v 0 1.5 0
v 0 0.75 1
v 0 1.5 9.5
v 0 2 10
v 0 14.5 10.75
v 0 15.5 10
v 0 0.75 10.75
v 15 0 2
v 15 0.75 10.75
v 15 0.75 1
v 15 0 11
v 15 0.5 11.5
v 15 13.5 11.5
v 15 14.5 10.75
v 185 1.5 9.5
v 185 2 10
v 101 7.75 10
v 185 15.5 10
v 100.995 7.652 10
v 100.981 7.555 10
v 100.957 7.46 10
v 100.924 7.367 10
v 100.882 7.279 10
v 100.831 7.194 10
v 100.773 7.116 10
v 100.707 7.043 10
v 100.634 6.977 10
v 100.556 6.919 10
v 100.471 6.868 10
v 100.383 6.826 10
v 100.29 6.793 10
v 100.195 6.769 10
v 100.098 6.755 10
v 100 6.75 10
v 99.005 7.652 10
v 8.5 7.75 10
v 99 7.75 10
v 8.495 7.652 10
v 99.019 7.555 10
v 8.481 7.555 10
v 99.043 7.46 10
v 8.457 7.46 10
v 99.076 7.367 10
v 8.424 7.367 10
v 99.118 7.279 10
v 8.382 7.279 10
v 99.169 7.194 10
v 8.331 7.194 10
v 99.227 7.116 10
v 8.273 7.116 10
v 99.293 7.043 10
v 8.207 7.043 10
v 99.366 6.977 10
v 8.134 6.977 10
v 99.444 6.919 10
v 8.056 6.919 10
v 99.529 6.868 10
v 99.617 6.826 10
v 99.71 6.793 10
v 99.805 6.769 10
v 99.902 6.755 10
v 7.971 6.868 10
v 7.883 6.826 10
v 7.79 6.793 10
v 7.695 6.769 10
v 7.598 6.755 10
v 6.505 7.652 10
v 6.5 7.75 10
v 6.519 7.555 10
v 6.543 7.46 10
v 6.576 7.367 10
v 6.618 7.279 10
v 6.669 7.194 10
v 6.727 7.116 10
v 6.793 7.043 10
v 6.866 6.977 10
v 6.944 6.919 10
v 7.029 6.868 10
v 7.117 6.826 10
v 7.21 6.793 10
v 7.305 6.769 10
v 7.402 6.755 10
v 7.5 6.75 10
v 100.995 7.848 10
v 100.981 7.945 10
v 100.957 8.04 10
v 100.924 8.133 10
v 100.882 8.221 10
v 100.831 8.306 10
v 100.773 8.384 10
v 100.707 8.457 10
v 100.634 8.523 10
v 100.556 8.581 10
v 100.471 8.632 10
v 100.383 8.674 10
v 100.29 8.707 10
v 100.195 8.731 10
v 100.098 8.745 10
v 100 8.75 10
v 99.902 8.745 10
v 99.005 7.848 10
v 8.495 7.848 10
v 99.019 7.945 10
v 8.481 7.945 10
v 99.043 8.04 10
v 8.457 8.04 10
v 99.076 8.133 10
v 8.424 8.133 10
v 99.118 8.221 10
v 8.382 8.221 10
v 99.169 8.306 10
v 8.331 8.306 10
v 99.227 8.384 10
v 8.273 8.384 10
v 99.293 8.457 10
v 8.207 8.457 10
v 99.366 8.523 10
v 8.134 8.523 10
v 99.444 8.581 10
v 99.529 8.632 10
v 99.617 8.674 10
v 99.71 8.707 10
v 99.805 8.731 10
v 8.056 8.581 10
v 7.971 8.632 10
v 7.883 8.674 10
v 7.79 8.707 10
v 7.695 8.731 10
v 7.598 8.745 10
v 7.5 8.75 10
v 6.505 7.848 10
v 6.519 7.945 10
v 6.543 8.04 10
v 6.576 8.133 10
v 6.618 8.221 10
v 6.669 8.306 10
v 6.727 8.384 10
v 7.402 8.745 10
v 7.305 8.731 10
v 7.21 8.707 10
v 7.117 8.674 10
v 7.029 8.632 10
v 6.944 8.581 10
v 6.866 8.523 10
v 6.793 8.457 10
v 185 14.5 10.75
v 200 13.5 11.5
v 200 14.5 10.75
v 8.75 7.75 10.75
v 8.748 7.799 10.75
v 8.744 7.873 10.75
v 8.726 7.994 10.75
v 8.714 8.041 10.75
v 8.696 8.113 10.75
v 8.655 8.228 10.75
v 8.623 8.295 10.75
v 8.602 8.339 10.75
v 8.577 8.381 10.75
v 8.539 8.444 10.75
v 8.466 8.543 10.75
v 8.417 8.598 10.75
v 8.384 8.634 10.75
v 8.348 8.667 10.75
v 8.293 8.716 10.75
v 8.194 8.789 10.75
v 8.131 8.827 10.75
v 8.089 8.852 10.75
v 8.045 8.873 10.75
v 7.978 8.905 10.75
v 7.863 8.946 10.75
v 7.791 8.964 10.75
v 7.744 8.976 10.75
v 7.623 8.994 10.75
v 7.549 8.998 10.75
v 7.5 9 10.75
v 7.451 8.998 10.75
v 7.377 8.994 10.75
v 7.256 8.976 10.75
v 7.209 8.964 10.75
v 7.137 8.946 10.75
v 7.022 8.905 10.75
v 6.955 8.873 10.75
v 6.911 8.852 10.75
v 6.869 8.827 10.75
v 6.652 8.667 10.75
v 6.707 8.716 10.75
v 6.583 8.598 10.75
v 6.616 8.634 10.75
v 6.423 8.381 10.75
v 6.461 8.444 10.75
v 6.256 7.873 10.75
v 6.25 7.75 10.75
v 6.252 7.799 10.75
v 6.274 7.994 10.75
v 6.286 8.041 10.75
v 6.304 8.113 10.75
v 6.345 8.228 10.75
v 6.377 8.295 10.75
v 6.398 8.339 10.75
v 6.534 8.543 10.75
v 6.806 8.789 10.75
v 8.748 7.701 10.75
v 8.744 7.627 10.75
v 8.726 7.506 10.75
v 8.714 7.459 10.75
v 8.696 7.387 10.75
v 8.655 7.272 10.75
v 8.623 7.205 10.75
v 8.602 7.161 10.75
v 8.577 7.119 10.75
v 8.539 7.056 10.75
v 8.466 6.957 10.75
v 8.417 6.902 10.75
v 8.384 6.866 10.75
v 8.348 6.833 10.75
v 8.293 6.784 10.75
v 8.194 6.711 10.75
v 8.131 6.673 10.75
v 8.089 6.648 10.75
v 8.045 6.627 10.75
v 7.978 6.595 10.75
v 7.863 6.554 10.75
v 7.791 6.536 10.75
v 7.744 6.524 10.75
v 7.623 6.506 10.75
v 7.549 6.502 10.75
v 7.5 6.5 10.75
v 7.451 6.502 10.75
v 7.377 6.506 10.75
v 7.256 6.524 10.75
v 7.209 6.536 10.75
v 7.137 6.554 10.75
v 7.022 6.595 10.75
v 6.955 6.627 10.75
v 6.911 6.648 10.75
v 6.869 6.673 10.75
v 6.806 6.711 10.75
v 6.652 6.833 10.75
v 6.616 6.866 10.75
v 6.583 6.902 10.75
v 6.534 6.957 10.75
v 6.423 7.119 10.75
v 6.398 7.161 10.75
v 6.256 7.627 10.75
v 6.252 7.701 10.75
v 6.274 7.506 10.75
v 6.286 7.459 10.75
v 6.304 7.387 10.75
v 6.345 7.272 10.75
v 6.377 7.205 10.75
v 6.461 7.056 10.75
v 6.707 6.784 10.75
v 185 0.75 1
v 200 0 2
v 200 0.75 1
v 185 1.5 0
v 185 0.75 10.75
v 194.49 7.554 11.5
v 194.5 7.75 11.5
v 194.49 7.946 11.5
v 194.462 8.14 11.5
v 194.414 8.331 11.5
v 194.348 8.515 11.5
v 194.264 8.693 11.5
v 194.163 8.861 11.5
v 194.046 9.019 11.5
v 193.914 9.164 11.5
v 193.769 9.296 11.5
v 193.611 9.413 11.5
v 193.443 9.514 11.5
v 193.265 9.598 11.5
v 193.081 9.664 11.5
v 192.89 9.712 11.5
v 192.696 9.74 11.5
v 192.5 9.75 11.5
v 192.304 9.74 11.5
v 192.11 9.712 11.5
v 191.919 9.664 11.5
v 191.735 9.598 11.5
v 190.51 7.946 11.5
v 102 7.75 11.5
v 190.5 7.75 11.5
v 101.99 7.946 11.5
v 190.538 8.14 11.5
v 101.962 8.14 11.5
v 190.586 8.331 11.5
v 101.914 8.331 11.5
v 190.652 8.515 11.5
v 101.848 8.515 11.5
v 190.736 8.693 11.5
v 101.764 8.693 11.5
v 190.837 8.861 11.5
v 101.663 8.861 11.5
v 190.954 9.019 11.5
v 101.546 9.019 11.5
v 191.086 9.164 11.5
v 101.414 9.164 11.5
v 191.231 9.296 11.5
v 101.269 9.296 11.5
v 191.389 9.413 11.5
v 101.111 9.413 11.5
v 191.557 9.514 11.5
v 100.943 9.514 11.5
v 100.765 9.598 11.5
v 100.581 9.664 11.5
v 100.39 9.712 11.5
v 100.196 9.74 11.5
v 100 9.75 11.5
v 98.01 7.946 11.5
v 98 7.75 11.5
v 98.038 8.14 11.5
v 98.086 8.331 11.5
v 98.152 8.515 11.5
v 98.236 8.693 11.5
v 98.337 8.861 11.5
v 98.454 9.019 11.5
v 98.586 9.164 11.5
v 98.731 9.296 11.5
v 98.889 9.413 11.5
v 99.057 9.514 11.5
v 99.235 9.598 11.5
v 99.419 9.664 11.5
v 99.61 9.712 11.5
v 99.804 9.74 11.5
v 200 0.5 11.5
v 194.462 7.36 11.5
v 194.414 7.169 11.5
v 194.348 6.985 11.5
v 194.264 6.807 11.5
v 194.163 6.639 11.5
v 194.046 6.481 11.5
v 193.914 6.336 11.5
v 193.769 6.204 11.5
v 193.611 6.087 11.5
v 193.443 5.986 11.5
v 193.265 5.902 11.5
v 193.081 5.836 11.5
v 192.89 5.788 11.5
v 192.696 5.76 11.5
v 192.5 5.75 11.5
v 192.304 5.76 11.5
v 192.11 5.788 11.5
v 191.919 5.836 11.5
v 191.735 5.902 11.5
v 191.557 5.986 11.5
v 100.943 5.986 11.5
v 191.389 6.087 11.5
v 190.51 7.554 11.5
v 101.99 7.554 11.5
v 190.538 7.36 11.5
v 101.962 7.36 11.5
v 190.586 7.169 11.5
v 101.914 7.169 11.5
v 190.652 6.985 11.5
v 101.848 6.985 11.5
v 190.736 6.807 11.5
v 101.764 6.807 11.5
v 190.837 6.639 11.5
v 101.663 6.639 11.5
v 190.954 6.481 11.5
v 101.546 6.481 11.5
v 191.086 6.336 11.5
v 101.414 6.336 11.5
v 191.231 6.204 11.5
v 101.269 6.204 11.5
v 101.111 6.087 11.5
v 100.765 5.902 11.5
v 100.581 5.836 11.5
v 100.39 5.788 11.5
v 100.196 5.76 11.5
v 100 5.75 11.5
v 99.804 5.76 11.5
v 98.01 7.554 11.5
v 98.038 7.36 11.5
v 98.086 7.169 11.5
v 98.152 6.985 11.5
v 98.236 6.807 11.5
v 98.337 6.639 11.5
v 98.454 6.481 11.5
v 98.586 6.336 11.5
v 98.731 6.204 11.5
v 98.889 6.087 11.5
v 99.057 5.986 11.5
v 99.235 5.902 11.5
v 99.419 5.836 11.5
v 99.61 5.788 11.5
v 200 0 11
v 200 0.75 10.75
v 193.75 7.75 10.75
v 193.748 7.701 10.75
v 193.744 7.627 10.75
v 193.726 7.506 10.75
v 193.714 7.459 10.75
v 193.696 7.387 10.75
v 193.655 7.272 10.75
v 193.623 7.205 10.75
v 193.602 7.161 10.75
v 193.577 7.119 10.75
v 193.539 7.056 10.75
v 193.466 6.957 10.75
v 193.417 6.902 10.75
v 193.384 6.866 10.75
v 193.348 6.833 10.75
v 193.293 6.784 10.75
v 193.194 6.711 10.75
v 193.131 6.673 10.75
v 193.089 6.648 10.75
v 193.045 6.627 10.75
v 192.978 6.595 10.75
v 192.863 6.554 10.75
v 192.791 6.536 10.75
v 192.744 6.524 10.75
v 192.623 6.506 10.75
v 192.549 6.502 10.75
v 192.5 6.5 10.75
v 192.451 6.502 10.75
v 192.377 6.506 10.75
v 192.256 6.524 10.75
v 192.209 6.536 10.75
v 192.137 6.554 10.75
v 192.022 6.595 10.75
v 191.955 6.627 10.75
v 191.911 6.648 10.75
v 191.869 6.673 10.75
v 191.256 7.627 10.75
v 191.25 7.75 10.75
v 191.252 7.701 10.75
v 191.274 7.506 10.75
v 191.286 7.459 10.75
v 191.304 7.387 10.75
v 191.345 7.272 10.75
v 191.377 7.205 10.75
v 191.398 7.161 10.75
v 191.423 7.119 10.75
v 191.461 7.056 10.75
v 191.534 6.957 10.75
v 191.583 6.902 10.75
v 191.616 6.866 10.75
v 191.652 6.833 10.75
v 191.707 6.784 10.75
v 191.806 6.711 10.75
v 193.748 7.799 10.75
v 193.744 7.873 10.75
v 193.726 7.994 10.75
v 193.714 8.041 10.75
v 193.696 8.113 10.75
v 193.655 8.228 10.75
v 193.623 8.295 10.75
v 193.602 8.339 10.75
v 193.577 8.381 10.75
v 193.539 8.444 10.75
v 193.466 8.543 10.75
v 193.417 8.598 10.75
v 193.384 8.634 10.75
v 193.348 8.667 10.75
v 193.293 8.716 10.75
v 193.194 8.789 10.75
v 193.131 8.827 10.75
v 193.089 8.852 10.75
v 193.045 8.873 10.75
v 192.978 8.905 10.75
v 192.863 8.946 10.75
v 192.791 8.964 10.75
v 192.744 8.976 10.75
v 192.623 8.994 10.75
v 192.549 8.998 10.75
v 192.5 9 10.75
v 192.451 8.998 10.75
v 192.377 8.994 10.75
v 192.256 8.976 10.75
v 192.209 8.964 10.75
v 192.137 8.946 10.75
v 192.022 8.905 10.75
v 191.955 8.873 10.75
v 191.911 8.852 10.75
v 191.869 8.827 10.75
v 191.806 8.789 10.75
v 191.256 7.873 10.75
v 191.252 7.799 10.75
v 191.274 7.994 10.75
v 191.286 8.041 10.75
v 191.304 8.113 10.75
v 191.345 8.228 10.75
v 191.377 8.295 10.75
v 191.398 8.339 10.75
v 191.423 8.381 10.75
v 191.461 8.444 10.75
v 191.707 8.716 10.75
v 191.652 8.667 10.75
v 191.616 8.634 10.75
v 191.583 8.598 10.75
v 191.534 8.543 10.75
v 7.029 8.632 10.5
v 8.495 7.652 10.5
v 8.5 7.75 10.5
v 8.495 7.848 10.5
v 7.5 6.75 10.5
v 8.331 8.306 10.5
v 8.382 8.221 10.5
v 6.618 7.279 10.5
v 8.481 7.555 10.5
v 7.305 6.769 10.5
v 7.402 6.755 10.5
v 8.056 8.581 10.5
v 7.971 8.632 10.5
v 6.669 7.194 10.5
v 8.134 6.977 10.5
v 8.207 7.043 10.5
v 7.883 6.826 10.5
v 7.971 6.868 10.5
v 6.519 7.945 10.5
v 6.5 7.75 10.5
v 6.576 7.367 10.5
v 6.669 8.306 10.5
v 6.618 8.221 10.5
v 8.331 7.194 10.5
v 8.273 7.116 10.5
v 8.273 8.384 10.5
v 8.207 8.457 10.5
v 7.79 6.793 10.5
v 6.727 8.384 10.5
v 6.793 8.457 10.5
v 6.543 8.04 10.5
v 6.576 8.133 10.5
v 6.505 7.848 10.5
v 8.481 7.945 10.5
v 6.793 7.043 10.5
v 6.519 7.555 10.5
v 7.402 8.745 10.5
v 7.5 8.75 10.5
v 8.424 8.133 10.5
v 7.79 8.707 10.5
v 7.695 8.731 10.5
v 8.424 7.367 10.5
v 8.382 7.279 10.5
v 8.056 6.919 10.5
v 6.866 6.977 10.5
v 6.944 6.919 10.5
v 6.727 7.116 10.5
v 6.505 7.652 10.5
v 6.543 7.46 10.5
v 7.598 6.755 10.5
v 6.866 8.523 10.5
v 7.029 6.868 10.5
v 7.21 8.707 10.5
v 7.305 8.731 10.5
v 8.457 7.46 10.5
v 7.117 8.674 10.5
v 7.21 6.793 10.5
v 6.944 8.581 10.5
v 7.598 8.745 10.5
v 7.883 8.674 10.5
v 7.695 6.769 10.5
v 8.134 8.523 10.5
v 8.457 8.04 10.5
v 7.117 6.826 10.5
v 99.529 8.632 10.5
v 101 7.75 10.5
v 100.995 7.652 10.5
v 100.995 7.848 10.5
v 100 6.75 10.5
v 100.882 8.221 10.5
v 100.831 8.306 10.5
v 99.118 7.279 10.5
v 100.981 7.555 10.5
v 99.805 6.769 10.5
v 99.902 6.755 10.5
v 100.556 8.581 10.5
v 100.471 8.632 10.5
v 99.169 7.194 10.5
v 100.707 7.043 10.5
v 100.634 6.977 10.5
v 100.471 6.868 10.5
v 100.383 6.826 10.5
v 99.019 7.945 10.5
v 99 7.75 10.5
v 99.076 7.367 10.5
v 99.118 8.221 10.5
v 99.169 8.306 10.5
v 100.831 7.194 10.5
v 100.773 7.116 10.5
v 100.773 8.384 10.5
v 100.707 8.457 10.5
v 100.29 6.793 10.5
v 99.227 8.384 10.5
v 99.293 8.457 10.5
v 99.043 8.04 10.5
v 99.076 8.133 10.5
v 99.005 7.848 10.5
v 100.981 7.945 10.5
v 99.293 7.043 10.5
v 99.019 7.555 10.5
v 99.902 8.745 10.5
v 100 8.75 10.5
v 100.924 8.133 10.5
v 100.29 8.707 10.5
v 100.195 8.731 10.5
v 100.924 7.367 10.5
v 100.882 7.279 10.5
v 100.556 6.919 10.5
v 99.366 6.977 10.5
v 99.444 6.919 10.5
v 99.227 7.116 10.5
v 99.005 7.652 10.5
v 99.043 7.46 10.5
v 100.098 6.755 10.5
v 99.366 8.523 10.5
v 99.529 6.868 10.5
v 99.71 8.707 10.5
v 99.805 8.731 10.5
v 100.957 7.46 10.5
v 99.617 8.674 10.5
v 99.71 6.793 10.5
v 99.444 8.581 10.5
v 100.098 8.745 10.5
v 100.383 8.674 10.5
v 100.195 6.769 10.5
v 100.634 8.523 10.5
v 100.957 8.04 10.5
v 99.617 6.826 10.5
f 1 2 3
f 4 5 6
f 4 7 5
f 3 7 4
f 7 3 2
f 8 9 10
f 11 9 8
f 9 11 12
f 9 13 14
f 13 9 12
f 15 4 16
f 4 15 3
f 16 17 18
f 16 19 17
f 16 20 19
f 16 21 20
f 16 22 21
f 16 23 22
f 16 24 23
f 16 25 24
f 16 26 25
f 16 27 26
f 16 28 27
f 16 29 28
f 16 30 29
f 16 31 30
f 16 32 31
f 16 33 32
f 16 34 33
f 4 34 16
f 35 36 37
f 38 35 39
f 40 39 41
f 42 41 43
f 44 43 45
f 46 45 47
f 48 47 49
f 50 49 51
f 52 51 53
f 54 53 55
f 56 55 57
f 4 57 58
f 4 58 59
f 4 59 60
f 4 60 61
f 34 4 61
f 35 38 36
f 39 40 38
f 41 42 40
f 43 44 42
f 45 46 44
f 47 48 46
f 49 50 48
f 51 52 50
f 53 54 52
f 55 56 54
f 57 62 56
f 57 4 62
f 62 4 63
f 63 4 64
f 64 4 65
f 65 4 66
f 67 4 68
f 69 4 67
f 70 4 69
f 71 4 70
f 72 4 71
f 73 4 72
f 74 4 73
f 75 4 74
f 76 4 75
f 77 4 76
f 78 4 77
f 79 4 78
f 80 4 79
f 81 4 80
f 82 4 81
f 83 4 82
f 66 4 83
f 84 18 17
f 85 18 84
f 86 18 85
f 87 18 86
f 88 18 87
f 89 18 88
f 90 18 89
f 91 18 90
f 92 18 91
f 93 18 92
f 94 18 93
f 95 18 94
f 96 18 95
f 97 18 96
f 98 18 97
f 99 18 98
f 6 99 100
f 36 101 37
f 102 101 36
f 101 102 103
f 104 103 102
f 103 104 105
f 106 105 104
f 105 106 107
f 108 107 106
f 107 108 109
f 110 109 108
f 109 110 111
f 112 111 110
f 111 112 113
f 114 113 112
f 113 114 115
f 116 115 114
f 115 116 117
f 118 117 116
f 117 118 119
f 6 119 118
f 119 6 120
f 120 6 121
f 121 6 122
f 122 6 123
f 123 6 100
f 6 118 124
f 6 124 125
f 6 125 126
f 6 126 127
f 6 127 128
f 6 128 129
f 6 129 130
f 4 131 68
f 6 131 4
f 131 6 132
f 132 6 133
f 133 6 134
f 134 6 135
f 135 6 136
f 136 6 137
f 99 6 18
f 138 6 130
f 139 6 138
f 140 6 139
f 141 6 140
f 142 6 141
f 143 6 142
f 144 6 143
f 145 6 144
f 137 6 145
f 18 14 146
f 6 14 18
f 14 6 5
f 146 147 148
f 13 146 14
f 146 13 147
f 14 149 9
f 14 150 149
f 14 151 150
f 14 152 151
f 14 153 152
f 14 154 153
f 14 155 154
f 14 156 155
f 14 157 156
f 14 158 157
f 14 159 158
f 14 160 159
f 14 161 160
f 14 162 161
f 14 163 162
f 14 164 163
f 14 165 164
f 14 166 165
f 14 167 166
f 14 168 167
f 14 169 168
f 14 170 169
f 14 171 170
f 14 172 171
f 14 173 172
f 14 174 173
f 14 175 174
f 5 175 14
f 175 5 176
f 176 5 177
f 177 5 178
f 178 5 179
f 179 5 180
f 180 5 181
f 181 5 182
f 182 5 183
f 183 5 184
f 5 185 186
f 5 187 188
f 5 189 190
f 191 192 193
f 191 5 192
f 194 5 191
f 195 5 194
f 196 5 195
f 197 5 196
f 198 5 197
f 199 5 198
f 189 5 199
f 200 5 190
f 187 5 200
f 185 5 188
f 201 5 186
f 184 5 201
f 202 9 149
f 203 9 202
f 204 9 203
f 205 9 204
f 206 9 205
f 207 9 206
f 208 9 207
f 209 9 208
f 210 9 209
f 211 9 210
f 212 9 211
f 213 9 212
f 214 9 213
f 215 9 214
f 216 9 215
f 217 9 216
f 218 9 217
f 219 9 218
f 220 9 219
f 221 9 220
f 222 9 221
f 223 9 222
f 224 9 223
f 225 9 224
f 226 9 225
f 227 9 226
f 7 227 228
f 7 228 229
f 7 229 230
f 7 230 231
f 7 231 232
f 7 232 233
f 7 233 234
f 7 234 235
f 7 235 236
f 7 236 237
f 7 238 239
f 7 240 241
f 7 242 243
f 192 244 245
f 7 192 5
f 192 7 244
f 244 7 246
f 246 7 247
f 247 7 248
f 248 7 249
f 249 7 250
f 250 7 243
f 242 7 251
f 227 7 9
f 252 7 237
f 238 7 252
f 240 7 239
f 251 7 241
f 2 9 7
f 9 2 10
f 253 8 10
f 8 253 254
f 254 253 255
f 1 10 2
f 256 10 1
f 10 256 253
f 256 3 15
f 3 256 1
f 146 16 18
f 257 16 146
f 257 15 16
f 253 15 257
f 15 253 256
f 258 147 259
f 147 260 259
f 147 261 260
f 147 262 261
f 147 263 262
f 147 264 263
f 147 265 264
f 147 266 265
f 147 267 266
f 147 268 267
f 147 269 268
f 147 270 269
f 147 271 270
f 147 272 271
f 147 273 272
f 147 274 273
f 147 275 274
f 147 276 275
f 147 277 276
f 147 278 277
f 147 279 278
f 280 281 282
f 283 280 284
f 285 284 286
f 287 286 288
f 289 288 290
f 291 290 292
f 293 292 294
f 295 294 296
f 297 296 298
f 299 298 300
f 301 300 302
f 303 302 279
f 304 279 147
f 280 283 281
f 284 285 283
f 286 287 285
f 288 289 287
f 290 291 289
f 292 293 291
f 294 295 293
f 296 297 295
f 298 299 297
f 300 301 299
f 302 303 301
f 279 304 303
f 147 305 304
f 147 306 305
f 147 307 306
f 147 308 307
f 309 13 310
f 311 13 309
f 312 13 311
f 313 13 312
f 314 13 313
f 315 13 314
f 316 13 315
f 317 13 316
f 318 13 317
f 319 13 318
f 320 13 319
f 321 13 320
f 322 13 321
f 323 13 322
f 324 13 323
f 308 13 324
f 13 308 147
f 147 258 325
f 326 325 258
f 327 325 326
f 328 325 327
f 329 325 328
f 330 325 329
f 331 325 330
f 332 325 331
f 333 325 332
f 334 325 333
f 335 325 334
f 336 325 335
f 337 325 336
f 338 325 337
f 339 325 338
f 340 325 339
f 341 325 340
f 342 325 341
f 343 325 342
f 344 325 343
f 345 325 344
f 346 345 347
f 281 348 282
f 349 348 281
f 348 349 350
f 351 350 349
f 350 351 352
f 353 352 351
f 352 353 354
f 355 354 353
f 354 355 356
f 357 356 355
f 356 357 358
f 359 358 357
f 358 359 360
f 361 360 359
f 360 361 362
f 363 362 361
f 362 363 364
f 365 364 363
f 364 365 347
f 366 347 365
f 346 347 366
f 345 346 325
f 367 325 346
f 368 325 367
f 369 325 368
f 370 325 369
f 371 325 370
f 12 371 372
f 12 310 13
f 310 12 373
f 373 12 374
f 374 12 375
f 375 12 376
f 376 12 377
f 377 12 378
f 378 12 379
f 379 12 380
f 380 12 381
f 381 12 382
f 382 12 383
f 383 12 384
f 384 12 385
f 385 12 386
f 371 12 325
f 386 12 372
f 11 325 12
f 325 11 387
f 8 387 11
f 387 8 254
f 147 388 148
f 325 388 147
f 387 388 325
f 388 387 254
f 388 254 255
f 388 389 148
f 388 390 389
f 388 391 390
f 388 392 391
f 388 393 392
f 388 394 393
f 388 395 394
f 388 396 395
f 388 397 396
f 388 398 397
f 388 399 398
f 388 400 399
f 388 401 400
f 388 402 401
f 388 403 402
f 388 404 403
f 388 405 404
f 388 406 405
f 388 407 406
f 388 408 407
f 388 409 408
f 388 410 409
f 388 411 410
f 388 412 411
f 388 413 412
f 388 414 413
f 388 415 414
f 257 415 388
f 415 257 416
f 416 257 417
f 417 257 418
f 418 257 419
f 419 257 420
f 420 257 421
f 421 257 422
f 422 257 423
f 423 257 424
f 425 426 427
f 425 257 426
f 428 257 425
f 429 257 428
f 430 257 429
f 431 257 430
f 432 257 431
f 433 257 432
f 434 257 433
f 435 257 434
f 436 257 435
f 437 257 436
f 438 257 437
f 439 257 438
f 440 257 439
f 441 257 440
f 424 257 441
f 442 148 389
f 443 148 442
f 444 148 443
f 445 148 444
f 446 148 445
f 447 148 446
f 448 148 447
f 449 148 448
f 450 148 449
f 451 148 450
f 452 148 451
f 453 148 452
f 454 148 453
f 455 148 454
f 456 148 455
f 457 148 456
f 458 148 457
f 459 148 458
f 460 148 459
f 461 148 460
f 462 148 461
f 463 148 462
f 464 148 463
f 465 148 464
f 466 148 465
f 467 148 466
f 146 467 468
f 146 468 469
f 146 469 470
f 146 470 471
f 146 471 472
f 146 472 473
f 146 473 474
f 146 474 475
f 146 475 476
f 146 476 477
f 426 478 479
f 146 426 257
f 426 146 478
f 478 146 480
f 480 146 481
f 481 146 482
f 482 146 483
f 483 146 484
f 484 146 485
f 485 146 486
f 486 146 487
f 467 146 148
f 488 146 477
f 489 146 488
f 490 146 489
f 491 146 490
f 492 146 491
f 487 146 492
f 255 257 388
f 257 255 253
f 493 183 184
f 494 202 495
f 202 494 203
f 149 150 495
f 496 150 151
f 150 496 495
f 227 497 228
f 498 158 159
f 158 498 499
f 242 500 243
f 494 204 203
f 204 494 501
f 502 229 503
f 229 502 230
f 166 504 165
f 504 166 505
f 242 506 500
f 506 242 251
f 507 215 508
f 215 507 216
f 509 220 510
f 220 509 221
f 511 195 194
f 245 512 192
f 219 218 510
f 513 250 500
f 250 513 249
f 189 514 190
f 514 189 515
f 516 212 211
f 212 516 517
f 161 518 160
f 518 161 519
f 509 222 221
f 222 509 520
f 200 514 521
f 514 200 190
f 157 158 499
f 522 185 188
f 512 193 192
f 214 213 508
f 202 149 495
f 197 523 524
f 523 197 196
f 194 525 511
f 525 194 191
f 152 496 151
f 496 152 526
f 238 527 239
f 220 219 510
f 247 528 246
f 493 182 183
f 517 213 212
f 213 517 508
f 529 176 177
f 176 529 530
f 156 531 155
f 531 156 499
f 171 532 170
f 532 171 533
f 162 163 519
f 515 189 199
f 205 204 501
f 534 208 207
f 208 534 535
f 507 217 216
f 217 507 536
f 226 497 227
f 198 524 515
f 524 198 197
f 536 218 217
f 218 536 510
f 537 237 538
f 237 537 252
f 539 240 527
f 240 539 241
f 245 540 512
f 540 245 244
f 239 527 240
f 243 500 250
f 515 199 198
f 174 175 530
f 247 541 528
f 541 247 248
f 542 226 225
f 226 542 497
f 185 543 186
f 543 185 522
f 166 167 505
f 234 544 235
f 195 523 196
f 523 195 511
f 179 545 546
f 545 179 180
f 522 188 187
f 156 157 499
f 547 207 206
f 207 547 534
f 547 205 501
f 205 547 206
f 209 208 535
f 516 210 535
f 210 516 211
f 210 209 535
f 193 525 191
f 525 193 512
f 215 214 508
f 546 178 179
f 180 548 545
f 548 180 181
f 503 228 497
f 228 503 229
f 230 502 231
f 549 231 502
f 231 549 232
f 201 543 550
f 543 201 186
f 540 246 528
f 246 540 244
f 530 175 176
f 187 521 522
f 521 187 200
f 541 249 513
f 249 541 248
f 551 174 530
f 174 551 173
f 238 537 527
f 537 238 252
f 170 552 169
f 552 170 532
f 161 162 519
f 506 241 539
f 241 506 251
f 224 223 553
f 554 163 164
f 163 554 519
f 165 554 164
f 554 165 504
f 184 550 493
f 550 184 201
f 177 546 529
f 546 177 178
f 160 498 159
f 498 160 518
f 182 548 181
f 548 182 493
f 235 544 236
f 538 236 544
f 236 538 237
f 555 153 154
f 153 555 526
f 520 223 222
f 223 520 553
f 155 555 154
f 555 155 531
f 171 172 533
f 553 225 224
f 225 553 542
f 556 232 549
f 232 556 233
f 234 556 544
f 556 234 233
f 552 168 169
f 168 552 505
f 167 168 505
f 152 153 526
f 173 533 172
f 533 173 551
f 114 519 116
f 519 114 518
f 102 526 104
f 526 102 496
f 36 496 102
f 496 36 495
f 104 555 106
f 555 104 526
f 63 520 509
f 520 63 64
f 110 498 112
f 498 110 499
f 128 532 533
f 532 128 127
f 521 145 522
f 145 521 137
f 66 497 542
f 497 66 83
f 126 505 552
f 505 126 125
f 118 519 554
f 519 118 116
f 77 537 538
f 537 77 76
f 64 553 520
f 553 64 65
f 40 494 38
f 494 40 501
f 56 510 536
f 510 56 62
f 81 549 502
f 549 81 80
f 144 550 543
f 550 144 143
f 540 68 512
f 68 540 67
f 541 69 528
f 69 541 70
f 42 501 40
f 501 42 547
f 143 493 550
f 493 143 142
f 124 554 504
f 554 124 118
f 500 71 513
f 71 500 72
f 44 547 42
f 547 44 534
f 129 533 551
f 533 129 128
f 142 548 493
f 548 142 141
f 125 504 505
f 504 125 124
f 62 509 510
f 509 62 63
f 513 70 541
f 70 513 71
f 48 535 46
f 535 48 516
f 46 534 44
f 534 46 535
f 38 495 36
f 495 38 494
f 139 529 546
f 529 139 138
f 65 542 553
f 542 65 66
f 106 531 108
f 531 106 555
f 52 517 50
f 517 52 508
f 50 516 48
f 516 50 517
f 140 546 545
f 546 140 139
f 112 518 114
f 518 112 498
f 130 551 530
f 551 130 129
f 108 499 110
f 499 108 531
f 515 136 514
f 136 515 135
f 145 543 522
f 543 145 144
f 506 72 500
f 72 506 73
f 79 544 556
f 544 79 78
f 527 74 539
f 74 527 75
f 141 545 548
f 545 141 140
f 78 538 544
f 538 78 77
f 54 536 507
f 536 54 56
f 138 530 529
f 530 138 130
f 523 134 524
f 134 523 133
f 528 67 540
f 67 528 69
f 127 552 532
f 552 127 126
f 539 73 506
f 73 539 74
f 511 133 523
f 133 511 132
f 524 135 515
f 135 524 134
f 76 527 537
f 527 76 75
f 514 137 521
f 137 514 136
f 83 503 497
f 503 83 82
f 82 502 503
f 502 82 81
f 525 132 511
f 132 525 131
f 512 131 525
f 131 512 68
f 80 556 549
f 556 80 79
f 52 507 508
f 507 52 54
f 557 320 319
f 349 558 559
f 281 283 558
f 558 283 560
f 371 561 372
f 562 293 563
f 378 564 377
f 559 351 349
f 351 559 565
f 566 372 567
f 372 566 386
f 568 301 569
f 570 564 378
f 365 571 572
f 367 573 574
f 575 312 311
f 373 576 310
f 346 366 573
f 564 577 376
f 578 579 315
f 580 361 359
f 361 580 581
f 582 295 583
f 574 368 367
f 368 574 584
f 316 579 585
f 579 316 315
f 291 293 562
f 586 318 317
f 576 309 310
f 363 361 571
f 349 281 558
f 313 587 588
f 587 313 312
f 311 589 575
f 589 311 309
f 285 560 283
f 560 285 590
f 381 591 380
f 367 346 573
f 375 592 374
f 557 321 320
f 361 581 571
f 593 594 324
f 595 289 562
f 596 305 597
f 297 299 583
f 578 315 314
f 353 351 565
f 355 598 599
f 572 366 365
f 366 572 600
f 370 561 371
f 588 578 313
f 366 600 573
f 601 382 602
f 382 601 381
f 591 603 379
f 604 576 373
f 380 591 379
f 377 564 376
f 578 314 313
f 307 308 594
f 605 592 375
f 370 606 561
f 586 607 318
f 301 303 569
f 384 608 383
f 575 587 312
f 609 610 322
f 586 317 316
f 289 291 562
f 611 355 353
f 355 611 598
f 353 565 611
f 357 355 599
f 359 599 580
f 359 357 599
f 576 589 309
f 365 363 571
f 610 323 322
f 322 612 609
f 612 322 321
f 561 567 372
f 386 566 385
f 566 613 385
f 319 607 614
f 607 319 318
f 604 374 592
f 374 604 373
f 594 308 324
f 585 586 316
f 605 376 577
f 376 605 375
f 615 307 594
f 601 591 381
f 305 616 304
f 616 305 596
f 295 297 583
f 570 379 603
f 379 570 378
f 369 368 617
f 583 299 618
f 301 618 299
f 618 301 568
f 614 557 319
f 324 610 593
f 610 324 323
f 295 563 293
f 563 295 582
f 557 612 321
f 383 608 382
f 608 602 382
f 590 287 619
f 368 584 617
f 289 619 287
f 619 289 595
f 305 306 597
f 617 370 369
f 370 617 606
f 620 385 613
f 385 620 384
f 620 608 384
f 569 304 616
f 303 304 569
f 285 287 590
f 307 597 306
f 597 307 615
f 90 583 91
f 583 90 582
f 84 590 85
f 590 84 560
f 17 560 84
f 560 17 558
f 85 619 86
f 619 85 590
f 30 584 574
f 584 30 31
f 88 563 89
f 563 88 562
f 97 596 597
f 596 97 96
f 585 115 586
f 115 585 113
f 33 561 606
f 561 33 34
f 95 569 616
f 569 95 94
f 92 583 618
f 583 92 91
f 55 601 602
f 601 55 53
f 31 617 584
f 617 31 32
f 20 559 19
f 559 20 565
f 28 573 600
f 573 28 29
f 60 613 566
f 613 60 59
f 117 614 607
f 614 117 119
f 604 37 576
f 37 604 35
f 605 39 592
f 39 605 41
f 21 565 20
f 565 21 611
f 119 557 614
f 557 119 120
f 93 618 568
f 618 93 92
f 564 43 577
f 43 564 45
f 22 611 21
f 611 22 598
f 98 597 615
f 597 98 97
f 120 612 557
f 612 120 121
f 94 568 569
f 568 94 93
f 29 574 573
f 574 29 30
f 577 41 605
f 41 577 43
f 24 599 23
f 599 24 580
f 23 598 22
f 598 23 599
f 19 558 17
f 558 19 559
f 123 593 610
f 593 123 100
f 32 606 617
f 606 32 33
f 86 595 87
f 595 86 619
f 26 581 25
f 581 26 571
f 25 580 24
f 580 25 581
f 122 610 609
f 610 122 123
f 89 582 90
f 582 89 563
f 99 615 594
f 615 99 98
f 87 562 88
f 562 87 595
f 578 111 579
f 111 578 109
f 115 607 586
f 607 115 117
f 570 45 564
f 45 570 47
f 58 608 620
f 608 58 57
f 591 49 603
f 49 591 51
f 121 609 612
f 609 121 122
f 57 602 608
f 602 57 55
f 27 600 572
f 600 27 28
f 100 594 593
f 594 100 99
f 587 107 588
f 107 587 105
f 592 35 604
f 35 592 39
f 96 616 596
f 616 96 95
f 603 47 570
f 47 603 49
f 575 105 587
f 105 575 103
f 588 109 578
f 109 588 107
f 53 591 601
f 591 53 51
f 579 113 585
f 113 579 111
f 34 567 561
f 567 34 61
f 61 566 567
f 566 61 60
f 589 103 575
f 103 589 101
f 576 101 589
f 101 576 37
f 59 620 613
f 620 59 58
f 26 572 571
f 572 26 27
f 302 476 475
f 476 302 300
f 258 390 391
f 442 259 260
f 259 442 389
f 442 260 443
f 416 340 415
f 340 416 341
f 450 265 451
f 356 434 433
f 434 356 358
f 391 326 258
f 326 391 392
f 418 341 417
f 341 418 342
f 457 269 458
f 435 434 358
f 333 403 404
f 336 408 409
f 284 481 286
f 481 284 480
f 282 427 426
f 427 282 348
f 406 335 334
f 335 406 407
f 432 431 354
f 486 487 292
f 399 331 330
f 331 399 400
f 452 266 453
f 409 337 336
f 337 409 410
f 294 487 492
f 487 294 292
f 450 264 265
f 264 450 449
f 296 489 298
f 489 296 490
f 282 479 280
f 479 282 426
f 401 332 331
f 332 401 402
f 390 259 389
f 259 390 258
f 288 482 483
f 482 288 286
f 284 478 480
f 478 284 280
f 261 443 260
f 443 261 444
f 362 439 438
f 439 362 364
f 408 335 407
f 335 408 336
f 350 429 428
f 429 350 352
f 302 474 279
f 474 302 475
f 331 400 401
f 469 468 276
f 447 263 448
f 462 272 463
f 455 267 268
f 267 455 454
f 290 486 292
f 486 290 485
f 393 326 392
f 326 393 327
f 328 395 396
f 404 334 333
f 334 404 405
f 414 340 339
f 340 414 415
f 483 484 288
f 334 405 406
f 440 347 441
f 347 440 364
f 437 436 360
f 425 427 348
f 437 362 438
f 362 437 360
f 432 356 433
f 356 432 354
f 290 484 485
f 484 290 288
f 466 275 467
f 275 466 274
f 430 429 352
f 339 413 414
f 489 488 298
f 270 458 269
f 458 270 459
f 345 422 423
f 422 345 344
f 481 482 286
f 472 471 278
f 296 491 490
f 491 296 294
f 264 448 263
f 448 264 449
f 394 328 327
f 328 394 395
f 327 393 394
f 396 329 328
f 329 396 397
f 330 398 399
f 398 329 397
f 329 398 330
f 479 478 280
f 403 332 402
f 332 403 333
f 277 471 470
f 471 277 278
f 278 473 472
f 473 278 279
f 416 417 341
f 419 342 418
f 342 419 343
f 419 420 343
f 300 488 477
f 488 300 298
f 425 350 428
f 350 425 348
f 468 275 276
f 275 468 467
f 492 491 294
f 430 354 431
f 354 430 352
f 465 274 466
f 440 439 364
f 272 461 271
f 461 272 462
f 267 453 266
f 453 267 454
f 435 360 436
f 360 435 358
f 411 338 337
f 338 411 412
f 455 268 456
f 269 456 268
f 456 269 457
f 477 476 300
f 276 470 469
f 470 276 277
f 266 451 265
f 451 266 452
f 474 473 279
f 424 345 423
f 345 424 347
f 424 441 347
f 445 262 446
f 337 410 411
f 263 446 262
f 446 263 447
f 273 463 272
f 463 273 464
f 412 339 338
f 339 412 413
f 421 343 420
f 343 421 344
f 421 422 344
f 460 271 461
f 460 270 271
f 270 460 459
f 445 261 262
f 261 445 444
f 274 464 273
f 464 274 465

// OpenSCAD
/*

 ________
/  ______\
| |
| |
|/

*/

top_w=14;
side_w=10;
l=200;
t=1.5;

side_max = side_w+t;
top_max= top_w+t;


end_off=2;
corner_off=0.5;

connector_length=15;

screw_r1=2;
screw_r2=1;
screw_r_h=1;

res=64;

all();

module screw(){
  translate([0,0,side_max-screw_r_h]) 
  cylinder(r1=screw_r2,r2=screw_r1,h=screw_r_h, $fn=res);
  cylinder(r=screw_r2,h=side_max, $fn=res);
}

module all(){
  difference(){
    rotate([90,0,90])
    raw();

  translate([0,top_max/2]){
    translate([connector_length/2,0,0])
    #screw();

    translate([l/2,0,0])
    #screw();

    translate([l-connector_length/2,0,0])
    #screw();
  }
  

  }
}

module raw(){
  linear_extrude(height = connector_length) 
  connector_low_2d();

  translate([0,0,connector_length]) 
  linear_extrude(height = l-2*connector_length) 
  profile_2d();

  translate([0,0,l-connector_length]) 
  linear_extrude(height = connector_length) 
  connector_high_2d();
}

module connector_high_2d(){
  difference() {
    profile_2d();
    translate([t/2,-t/2,0])
    square([top_max,side_max]);
  }
}

module connector_low_2d(){
  intersection(){
    profile_2d();
    translate([t/2,-t/2,0])
    square([top_max,side_max]);
  }
}

module profile_2d() {
  polygon([
    [0,end_off],
    [0,side_max-corner_off],
    [corner_off,side_max],
    [top_max-end_off,side_max],
    [top_max,side_w],
    [t+corner_off,side_w],
    [t,side_w-corner_off],
    [t,0]
  ]);
  
}
